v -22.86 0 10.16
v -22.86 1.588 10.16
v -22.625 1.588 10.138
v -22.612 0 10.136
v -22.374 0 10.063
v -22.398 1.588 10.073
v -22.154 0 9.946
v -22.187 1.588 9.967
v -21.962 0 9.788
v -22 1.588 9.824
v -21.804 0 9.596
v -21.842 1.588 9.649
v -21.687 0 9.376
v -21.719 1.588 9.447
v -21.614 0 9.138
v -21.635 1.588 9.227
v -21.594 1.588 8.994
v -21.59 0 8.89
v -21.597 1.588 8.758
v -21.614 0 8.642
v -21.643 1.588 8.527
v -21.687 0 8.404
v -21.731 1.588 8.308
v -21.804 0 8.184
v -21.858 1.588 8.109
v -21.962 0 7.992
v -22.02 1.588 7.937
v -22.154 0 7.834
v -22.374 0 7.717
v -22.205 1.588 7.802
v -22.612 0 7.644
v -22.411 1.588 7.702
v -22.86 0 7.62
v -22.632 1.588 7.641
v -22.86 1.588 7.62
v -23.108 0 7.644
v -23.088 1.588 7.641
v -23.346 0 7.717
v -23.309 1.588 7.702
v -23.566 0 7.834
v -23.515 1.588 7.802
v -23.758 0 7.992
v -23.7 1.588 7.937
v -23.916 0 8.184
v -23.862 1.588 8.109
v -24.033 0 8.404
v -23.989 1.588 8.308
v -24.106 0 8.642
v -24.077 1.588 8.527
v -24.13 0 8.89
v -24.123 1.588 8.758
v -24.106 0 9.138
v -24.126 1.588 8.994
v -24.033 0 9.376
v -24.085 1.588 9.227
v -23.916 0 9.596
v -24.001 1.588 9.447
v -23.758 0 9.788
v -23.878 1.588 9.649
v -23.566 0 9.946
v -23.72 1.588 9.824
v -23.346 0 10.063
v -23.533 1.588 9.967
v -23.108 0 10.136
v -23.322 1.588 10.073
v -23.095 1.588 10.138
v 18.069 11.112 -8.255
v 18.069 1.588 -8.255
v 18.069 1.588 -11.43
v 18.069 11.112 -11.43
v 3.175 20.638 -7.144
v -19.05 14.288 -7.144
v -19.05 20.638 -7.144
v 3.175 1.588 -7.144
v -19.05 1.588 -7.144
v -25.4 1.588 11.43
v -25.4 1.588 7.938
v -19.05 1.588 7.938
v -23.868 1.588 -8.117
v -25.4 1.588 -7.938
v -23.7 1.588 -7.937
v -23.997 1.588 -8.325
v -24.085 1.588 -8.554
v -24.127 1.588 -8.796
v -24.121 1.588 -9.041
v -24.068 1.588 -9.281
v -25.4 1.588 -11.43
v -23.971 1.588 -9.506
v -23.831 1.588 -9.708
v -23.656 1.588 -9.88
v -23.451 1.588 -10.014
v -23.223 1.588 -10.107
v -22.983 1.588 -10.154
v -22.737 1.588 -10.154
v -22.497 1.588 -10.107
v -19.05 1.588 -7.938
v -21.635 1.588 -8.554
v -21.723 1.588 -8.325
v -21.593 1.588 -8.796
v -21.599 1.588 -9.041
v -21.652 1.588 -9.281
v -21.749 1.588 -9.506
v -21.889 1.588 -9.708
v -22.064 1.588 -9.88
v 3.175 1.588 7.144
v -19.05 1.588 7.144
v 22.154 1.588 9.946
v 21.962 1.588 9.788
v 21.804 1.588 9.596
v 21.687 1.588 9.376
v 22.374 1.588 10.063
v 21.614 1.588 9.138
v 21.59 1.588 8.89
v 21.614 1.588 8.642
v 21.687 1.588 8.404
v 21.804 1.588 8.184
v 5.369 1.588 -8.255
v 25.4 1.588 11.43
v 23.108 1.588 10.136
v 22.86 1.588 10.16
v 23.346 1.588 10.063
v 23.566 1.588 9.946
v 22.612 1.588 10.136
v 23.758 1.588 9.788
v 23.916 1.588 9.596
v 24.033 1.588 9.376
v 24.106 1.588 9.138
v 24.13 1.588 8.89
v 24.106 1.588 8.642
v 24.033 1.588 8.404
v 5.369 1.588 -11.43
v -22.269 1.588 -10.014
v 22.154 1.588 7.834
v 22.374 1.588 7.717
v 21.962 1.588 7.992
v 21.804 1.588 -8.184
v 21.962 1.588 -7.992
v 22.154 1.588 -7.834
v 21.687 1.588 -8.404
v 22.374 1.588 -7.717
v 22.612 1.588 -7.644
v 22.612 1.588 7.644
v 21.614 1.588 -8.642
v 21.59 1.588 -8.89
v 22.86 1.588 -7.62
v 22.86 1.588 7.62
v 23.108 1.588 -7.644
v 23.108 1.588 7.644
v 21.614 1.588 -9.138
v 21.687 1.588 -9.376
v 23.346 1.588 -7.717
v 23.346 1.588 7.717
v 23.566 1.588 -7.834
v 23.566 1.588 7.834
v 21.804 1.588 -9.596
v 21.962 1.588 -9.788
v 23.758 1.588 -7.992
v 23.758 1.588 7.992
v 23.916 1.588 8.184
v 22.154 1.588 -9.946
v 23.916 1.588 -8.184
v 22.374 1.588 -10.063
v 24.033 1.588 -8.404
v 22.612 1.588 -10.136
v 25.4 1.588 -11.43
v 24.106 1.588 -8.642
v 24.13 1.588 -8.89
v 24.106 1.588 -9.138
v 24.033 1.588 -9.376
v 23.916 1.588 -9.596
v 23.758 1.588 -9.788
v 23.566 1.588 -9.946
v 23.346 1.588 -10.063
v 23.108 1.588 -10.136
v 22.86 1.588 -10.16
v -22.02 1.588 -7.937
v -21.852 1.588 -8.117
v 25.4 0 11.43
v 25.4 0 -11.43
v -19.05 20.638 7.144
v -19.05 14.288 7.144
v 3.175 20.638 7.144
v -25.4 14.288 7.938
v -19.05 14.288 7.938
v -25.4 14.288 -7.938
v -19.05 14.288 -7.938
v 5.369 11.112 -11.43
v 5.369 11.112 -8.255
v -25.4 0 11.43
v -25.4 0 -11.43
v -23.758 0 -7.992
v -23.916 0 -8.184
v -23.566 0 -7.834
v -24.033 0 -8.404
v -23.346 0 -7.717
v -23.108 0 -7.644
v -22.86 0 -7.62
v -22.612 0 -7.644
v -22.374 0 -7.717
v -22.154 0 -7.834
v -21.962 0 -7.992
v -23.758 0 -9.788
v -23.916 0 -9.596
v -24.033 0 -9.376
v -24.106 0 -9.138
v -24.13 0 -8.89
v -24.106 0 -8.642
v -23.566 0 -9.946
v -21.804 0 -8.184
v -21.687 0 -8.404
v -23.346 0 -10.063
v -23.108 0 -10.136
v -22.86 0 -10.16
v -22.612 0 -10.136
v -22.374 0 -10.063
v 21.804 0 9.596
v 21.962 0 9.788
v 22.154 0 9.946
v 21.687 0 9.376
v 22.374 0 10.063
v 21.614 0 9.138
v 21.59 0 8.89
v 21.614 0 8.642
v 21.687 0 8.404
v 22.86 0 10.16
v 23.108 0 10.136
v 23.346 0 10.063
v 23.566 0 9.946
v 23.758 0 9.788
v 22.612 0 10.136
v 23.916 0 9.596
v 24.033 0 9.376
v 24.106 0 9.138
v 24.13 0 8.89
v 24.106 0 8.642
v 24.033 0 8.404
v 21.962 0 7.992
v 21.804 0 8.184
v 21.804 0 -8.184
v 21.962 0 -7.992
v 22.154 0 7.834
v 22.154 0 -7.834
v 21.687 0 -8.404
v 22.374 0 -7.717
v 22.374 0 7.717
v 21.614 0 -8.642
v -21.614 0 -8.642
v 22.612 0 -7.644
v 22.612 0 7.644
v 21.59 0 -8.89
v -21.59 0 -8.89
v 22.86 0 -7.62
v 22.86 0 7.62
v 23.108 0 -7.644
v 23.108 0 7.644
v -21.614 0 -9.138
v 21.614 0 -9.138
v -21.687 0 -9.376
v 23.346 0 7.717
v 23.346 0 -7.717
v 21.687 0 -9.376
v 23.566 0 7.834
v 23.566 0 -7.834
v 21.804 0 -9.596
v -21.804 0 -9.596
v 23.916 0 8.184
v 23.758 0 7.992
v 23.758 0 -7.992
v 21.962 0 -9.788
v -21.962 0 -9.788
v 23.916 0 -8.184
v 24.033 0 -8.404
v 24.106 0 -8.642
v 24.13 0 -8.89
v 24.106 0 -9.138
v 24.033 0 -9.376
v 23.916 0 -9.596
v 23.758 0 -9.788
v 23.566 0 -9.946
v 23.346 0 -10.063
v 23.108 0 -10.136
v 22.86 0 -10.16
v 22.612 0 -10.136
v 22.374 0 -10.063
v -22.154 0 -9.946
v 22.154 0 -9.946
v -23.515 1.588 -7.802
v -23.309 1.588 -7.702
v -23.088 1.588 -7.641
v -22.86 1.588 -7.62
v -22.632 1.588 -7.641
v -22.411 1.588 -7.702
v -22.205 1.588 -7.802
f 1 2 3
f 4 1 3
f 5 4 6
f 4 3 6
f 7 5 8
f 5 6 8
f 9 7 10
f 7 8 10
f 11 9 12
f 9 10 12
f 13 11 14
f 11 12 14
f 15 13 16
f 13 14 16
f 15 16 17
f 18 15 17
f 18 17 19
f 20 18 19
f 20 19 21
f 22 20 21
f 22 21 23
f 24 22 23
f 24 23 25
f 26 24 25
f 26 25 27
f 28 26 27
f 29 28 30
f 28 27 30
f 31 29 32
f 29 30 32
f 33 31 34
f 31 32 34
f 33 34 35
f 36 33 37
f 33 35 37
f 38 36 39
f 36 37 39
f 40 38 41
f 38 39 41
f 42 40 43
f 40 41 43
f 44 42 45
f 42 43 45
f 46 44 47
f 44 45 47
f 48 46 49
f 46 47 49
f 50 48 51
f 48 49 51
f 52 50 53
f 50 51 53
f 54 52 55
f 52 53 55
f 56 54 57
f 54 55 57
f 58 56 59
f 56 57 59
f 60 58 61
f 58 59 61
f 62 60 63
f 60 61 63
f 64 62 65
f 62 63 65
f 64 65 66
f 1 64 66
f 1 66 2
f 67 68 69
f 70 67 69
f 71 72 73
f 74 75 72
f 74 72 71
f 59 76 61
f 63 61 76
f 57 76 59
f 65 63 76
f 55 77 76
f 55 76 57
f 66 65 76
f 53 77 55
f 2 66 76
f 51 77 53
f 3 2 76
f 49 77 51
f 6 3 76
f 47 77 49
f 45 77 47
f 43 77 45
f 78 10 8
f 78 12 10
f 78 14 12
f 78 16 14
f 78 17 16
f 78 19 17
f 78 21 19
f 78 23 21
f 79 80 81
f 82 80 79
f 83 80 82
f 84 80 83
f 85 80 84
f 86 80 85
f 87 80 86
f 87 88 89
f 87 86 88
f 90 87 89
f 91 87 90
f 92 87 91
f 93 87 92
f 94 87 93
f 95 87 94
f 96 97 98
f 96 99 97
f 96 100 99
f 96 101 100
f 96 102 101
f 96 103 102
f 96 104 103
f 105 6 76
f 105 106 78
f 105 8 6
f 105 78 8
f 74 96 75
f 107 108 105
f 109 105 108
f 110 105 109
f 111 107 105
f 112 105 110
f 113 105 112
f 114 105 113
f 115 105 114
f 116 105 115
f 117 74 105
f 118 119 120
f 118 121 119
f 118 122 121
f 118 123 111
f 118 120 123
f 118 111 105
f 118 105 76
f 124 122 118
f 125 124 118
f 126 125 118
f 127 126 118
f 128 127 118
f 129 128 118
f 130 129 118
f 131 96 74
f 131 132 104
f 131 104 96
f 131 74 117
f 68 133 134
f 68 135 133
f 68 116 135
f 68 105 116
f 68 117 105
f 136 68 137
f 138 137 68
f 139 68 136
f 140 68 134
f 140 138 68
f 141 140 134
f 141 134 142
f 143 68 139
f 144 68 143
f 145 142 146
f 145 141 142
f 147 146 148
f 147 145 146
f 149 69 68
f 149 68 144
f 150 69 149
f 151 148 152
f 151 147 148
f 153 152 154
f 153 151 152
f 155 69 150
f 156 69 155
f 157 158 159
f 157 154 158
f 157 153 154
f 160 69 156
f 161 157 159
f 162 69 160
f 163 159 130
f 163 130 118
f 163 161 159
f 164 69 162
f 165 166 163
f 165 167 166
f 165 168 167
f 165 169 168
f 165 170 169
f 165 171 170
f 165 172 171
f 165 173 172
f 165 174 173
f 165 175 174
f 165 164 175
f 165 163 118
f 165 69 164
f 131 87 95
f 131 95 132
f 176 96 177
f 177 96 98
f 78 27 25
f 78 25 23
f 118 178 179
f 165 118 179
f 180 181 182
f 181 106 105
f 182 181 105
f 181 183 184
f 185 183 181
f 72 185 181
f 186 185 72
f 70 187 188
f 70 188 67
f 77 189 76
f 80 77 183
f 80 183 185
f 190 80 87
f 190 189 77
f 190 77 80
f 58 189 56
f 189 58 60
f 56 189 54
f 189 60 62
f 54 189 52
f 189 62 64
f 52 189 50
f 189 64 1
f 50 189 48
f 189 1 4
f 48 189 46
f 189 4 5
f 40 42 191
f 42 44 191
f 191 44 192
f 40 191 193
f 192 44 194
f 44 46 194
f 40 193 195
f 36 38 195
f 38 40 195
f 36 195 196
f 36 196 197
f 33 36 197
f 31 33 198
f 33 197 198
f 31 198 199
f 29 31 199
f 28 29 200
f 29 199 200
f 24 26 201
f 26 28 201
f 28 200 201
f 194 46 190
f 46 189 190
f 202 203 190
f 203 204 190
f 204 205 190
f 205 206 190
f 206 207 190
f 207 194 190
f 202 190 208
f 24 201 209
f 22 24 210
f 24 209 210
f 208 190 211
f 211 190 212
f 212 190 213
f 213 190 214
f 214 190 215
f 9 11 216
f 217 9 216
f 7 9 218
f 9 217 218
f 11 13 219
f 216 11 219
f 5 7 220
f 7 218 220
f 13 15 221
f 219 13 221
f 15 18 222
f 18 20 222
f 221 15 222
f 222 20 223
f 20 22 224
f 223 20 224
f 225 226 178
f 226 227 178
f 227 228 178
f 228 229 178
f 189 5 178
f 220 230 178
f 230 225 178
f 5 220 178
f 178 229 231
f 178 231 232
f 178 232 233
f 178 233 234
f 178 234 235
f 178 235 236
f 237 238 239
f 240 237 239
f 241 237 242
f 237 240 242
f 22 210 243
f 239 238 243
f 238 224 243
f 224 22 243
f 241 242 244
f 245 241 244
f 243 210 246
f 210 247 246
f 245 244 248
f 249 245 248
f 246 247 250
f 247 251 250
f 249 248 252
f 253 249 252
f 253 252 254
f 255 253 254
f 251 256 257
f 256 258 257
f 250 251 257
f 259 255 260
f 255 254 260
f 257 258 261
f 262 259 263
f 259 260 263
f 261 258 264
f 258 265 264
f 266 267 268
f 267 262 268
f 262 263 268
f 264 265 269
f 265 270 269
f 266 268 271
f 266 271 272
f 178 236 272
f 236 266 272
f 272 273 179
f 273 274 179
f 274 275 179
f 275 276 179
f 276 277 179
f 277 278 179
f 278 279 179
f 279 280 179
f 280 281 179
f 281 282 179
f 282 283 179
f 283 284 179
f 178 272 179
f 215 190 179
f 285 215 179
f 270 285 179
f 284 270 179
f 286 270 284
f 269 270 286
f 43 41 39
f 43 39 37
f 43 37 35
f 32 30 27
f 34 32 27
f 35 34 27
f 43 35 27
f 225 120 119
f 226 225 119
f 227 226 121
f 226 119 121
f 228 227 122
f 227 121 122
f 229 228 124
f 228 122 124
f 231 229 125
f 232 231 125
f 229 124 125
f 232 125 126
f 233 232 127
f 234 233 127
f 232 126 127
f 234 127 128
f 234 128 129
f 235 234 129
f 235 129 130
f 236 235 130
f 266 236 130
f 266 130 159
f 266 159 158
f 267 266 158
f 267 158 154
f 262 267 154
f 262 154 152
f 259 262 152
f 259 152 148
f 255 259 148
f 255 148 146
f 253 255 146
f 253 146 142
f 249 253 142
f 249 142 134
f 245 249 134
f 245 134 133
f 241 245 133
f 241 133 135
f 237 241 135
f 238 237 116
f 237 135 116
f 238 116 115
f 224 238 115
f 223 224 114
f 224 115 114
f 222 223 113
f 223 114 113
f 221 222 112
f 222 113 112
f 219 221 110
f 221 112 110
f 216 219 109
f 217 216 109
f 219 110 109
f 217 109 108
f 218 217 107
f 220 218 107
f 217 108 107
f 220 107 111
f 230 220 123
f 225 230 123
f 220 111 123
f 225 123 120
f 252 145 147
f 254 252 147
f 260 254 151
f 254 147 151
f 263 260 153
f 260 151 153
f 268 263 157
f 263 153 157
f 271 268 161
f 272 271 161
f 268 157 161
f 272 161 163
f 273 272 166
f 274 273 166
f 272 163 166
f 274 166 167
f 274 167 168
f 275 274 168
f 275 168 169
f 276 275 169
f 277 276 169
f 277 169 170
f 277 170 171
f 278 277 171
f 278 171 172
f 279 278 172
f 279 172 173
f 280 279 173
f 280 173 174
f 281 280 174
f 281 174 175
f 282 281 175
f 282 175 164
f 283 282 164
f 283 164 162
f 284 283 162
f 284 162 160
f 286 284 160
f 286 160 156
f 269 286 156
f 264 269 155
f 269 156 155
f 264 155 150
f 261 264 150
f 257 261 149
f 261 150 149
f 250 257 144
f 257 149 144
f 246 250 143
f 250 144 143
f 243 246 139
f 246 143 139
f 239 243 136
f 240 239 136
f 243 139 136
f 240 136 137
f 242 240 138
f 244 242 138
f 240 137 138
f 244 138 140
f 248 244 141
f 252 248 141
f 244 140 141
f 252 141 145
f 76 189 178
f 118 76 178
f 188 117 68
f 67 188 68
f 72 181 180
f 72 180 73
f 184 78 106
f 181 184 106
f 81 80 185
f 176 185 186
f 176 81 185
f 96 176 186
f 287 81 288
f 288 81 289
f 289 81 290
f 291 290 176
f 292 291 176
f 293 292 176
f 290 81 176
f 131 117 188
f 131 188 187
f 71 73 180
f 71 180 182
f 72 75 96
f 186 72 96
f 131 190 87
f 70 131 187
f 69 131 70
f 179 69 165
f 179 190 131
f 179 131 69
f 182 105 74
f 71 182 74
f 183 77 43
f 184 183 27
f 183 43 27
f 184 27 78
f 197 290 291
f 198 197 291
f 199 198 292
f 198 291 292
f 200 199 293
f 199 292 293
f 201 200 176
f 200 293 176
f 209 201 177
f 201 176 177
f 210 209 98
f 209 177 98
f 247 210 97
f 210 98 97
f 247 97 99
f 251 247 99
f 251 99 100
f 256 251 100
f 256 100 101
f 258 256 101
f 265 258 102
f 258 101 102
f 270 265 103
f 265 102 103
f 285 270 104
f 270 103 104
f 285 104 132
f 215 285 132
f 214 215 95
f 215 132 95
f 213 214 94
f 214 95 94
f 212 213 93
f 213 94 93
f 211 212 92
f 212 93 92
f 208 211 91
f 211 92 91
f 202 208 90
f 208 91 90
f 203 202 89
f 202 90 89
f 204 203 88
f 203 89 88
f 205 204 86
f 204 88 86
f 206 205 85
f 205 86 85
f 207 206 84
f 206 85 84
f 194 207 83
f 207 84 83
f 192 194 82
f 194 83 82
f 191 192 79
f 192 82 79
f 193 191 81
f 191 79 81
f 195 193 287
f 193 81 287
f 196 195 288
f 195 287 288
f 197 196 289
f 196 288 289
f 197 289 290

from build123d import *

# Parameters (mm, degrees)
SKETCH1_W           = 50.8
SKETCH1_H           = 22.86
BOSS_EXTRUDE1_DEPTH = 1.5875
SKETCH2_W           = 6.35
SKETCH2_H           = 15.875
BOSS_EXTRUDE2_DEPTH = 12.7
SKETCH3_W           = 22.225
SKETCH3_H           = 14.2875
BOSS_EXTRUDE3_DEPTH = 19.05
SKETCH4_W           = 12.7
SKETCH4_H           = 3.175
BOSS_EXTRUDE4_DEPTH = 9.525
SKETCH5_R           = 1.27
CUT_EXTRUDE1_DEPTH  = 34.744738849


with BuildPart() as part:
    # Sketch1 → Boss-Extrude1 (new body)
    with BuildSketch(Plane(origin=(0, 0, 0), x_dir=(1, 0, 0), z_dir=(0, 1, 0))):
        Rectangle(SKETCH1_W, SKETCH1_H)
    extrude(amount=BOSS_EXTRUDE1_DEPTH)

    # Sketch2 → Boss-Extrude2 (add)
    with BuildSketch(Plane(origin=(0, 1.5875, 0), x_dir=(1, 0, 0), z_dir=(0, 1, 0))):
        with Locations((-22.225, 0)):
            Rectangle(SKETCH2_W, SKETCH2_H)
    extrude(amount=BOSS_EXTRUDE2_DEPTH)

    # Sketch3 → Boss-Extrude3 (add)
    with BuildSketch(Plane(origin=(0, 1.5875, 0), x_dir=(1, 0, 0), z_dir=(0, 1, 0))):
        with Locations((-7.9375, 0)):
            Rectangle(SKETCH3_W, SKETCH3_H)
    extrude(amount=BOSS_EXTRUDE3_DEPTH)

    # Sketch4 → Boss-Extrude4 (add)
    with BuildSketch(Plane(origin=(0, 1.5875, 0), x_dir=(1, 0, 0), z_dir=(0, 1, 0))):
        with Locations((11.719402779, 9.8425)):
            Rectangle(SKETCH4_W, SKETCH4_H)
    extrude(amount=BOSS_EXTRUDE4_DEPTH)

    # Sketch5 → Cut-Extrude1 (cut, through all)
    with BuildSketch(Plane(origin=(0, 1.5875, 0), x_dir=(1, 0, 0), z_dir=(0, 1, 0))):
        with Locations(Location((-22.86, 8.89, 0), (0, 0, 270))):
            Circle(SKETCH5_R)
        with Locations(Location((22.86, 8.89, 0), (0, 0, 270))):
            Circle(SKETCH5_R)
        with Locations(Location((-22.86, -8.89, 0), (0, 0, 270))):
            Circle(SKETCH5_R)
        with Locations(Location((22.86, -8.89, 0), (0, 0, 270))):
            Circle(SKETCH5_R)
    extrude(amount=-CUT_EXTRUDE1_DEPTH, mode=Mode.SUBTRACT)


solid = part.part
